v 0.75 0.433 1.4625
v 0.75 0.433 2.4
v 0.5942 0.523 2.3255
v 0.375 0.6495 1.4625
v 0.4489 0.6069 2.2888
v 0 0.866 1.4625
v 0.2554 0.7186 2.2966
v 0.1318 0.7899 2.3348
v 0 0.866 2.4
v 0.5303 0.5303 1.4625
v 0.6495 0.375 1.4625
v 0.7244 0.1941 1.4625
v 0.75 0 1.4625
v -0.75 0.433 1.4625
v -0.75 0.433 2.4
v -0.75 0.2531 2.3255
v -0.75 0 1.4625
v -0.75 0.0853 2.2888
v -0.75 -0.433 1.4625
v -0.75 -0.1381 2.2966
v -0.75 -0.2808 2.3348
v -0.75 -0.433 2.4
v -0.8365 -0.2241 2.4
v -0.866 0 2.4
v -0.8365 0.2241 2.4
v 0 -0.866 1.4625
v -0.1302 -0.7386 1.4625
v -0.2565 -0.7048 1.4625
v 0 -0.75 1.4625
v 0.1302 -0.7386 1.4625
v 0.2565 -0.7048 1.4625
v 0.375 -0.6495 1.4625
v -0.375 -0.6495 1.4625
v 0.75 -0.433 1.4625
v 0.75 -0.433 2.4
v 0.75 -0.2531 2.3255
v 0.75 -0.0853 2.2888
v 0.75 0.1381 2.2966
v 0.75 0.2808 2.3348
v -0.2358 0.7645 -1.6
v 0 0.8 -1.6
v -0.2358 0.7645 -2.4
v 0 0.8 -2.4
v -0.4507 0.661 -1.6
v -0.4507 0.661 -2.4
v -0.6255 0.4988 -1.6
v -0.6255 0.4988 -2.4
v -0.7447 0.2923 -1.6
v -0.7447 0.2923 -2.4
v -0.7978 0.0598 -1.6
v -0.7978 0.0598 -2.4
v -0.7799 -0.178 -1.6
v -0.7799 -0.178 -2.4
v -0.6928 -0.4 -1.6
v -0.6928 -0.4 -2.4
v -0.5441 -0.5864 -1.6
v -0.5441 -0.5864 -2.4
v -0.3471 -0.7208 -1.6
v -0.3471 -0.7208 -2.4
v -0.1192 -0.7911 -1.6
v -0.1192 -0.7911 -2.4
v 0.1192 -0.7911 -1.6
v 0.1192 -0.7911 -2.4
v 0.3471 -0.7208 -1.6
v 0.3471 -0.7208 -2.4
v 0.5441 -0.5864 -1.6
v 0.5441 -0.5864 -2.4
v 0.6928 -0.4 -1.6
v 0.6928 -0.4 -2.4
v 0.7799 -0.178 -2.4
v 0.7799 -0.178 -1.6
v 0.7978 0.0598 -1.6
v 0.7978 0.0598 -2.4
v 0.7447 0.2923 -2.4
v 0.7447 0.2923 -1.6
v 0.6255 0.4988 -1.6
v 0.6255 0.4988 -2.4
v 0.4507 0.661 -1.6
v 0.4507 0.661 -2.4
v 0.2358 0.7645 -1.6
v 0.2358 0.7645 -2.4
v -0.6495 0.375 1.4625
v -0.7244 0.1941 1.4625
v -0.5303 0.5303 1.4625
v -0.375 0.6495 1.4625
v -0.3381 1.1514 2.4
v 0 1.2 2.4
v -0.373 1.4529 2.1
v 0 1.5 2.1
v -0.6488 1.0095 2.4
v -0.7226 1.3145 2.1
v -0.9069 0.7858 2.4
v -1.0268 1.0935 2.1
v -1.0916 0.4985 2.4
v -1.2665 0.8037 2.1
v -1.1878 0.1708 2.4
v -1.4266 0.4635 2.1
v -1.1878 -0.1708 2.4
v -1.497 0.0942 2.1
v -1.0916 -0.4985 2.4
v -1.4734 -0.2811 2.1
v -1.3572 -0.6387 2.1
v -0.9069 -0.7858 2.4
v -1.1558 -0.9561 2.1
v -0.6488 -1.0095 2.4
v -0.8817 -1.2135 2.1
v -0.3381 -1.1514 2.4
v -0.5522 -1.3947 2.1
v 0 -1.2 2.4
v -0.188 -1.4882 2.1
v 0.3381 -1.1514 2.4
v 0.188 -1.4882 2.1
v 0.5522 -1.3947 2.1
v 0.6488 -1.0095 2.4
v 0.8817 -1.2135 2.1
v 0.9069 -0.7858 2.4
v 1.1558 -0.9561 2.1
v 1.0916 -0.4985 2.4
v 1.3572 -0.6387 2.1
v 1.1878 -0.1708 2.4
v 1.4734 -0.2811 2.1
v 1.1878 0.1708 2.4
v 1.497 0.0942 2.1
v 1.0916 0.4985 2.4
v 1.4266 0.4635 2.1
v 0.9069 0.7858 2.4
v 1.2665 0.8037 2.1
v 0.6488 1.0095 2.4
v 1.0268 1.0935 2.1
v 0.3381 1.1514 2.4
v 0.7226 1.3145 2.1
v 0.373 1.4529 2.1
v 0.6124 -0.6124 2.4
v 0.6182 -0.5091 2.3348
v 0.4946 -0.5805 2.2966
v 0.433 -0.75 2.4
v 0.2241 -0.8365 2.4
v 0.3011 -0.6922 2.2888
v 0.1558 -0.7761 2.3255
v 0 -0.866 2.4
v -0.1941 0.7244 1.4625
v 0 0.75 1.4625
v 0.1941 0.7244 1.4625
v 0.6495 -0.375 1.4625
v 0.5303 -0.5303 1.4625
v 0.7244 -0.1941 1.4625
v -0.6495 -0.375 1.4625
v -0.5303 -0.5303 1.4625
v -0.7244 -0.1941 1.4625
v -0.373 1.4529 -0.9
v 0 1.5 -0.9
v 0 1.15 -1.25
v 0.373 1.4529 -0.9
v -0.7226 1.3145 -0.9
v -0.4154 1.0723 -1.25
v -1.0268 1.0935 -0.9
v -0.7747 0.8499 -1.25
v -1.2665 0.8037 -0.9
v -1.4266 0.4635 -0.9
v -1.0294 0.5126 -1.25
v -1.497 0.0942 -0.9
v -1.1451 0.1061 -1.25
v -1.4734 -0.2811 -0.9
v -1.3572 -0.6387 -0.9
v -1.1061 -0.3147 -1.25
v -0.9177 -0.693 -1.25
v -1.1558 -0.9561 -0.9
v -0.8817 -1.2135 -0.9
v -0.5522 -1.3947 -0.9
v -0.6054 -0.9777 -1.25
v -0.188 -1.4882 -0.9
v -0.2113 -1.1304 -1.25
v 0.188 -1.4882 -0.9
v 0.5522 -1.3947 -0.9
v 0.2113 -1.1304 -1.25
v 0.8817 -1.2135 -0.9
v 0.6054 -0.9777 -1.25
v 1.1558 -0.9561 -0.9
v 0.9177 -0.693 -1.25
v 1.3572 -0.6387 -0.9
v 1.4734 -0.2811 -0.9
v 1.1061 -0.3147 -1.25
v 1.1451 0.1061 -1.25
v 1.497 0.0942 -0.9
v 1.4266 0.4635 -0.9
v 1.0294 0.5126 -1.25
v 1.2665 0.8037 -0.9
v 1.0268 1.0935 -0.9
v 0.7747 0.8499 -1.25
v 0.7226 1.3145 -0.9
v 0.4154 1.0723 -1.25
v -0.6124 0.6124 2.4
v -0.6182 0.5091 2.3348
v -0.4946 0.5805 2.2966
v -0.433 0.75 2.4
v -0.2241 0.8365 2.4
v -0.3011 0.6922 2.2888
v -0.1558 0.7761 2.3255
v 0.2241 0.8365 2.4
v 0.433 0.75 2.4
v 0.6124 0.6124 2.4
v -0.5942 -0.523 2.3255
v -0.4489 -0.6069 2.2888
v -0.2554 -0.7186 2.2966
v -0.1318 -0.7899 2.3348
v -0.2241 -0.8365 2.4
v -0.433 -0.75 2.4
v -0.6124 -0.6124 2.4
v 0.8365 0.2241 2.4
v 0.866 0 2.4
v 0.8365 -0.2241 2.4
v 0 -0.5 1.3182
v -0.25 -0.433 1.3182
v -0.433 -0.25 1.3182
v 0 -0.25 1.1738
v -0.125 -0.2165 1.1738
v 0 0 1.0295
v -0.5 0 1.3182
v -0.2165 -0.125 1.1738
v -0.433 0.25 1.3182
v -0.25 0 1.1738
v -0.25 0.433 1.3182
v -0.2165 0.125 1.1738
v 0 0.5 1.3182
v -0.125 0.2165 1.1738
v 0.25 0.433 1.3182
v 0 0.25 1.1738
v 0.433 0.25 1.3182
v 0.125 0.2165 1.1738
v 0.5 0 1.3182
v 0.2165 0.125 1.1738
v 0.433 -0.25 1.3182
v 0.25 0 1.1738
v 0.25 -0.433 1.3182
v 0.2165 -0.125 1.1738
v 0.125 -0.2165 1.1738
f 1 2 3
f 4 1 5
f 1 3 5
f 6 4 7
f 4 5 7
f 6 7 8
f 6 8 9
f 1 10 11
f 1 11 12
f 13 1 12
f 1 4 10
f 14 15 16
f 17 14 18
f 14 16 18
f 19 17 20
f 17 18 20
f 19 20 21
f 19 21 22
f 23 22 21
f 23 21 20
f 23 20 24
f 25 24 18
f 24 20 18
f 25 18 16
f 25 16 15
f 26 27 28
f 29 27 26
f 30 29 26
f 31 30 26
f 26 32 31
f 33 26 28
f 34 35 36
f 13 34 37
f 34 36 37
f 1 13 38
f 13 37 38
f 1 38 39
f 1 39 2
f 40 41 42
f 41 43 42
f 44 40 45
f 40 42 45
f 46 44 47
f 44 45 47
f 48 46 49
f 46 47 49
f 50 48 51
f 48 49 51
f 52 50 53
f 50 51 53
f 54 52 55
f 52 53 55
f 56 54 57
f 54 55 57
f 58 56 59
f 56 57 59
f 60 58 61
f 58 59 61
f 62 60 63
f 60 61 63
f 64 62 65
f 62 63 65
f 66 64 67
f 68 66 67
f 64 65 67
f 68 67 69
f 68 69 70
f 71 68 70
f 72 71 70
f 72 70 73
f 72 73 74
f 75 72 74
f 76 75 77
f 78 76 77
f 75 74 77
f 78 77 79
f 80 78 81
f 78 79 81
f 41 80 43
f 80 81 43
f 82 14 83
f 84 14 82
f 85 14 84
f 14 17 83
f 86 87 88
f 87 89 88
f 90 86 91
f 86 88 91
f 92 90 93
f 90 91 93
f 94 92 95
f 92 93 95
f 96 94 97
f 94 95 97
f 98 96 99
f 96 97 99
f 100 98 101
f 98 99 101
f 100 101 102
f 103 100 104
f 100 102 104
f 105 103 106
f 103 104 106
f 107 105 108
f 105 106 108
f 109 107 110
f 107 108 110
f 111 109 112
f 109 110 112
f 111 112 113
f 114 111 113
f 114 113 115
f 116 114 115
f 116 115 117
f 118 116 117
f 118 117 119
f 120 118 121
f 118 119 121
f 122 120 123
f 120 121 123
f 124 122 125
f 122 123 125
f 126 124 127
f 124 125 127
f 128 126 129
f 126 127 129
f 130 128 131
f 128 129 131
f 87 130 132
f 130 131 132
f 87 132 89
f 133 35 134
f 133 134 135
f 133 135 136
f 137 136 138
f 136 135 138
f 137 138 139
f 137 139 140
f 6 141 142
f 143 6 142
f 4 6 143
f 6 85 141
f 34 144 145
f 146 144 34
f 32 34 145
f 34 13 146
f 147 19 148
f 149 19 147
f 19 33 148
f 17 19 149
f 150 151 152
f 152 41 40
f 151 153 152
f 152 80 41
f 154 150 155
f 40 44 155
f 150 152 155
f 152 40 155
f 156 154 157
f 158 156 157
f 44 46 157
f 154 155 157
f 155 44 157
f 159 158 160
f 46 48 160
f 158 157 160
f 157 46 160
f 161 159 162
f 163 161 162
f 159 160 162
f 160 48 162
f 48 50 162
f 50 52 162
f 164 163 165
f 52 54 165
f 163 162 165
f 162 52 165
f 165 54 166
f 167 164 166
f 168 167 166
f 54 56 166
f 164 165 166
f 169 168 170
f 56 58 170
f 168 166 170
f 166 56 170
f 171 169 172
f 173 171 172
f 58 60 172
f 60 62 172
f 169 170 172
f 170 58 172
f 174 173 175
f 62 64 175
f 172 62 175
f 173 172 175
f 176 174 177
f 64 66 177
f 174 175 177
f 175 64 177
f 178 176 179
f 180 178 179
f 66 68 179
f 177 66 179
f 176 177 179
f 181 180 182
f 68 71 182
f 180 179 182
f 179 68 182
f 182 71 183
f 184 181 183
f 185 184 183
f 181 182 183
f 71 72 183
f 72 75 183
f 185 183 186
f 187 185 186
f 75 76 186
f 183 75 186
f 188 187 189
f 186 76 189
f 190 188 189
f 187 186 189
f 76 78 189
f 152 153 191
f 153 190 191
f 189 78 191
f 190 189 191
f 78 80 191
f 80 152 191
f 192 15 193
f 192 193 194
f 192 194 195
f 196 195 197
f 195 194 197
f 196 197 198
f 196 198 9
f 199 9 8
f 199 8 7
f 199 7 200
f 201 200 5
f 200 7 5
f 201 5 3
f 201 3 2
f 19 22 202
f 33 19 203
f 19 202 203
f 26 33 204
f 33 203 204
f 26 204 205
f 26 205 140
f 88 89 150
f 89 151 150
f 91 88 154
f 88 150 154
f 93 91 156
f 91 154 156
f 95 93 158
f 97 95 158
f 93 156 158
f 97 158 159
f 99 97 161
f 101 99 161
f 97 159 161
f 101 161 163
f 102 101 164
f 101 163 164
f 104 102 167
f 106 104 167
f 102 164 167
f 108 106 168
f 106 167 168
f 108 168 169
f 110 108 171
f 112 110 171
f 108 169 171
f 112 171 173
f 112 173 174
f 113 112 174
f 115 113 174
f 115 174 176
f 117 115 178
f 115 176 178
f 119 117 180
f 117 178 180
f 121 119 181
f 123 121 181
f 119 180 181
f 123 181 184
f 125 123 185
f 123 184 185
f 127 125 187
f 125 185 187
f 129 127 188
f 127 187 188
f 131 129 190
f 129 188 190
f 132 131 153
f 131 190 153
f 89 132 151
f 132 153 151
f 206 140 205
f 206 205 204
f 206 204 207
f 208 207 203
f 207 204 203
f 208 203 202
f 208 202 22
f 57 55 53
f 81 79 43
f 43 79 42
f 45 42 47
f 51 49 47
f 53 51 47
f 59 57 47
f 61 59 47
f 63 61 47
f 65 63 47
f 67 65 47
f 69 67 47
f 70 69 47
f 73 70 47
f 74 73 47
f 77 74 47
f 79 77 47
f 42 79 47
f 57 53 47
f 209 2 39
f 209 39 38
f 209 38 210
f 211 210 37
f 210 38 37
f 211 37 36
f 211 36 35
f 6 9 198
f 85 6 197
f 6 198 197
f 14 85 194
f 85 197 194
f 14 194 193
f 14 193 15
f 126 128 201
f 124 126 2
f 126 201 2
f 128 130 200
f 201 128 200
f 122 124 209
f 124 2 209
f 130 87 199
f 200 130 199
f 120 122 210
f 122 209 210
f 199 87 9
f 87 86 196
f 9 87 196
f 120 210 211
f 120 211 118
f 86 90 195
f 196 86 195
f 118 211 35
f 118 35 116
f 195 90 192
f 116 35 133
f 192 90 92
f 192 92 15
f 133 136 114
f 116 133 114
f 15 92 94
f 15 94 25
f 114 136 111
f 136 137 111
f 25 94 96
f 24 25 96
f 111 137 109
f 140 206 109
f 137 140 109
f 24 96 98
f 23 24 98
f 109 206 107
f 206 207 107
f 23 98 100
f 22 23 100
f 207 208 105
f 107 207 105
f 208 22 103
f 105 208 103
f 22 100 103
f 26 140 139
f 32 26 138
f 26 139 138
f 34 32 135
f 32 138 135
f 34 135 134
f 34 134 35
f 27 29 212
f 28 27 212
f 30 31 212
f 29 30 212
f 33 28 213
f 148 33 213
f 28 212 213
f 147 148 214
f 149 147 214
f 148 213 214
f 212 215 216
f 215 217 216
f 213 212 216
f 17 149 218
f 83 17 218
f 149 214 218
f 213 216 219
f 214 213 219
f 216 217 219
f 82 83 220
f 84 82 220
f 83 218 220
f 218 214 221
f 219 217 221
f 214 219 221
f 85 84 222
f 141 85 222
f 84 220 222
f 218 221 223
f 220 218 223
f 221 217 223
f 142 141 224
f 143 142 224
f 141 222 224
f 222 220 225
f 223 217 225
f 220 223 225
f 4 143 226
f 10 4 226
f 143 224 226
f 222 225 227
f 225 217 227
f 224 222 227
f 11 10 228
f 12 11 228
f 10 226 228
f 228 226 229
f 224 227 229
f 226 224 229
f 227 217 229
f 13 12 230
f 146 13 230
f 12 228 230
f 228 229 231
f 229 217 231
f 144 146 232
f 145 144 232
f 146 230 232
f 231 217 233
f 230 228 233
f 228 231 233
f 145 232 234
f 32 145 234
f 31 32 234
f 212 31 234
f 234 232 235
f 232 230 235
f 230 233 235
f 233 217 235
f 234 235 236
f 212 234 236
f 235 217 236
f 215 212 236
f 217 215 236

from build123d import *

# Parameters (mm, degrees)
CUT_EXTRUDE1_DEPTH = 0.9375


with BuildPart() as part:
    # Sketch22 → Revolve1 (revolve)
    with BuildSketch(Plane(origin=(0, 0, 0), x_dir=(0, 0, -1), z_dir=(1, 0, 0))):
        Polygon((-2.4, 0), (-2.4, 1.2), (-2.1, 1.5), (0.9, 1.5), (1.6, 0.8), (2.4, 0.8), (2.4, 0), align=None)
    revolve(axis=Axis((0, 0, -2.4), (0, 0, 1)))

    # Sketch30 → Cut-Extrude1 (cut)
    with BuildSketch(Plane.XY.offset(2.4)):
        Polygon((0.75, -0.433012702), (0.75, 0.433012702), (0, 0.866025404), (-0.75, 0.433012702), (-0.75, -0.433012702), (0, -0.866025404), align=None)
    extrude(amount=-CUT_EXTRUDE1_DEPTH, mode=Mode.SUBTRACT)

    # Cut-Extrude2 cone 1 section (through the dimple's axis) → Cut-Extrude2 (revolve, cut)
    with BuildSketch(Plane(origin=(0, 0, 2.4), x_dir=(0, -1, 0), z_dir=(1, 0, 0))):
        Polygon((0, 0), (0.866025404, 0), (0, 0.866025404), align=None)
    revolve(axis=Axis((0, 0, 2.4), (0, 0, -1)), mode=Mode.SUBTRACT)

    # Cut-Extrude3 cone 1 section (through the dimple's axis) → Cut-Extrude3 (revolve, cut)
    with BuildSketch(Plane(origin=(0, 0, 1.4625), x_dir=(0, -1, 0), z_dir=(1, 0, 0))):
        Polygon((0, 0), (0.75, 0), (0, 0.433012702), align=None)
    revolve(axis=Axis((0, 0, 1.4625), (0, 0, -1)), mode=Mode.SUBTRACT)


solid = part.part
